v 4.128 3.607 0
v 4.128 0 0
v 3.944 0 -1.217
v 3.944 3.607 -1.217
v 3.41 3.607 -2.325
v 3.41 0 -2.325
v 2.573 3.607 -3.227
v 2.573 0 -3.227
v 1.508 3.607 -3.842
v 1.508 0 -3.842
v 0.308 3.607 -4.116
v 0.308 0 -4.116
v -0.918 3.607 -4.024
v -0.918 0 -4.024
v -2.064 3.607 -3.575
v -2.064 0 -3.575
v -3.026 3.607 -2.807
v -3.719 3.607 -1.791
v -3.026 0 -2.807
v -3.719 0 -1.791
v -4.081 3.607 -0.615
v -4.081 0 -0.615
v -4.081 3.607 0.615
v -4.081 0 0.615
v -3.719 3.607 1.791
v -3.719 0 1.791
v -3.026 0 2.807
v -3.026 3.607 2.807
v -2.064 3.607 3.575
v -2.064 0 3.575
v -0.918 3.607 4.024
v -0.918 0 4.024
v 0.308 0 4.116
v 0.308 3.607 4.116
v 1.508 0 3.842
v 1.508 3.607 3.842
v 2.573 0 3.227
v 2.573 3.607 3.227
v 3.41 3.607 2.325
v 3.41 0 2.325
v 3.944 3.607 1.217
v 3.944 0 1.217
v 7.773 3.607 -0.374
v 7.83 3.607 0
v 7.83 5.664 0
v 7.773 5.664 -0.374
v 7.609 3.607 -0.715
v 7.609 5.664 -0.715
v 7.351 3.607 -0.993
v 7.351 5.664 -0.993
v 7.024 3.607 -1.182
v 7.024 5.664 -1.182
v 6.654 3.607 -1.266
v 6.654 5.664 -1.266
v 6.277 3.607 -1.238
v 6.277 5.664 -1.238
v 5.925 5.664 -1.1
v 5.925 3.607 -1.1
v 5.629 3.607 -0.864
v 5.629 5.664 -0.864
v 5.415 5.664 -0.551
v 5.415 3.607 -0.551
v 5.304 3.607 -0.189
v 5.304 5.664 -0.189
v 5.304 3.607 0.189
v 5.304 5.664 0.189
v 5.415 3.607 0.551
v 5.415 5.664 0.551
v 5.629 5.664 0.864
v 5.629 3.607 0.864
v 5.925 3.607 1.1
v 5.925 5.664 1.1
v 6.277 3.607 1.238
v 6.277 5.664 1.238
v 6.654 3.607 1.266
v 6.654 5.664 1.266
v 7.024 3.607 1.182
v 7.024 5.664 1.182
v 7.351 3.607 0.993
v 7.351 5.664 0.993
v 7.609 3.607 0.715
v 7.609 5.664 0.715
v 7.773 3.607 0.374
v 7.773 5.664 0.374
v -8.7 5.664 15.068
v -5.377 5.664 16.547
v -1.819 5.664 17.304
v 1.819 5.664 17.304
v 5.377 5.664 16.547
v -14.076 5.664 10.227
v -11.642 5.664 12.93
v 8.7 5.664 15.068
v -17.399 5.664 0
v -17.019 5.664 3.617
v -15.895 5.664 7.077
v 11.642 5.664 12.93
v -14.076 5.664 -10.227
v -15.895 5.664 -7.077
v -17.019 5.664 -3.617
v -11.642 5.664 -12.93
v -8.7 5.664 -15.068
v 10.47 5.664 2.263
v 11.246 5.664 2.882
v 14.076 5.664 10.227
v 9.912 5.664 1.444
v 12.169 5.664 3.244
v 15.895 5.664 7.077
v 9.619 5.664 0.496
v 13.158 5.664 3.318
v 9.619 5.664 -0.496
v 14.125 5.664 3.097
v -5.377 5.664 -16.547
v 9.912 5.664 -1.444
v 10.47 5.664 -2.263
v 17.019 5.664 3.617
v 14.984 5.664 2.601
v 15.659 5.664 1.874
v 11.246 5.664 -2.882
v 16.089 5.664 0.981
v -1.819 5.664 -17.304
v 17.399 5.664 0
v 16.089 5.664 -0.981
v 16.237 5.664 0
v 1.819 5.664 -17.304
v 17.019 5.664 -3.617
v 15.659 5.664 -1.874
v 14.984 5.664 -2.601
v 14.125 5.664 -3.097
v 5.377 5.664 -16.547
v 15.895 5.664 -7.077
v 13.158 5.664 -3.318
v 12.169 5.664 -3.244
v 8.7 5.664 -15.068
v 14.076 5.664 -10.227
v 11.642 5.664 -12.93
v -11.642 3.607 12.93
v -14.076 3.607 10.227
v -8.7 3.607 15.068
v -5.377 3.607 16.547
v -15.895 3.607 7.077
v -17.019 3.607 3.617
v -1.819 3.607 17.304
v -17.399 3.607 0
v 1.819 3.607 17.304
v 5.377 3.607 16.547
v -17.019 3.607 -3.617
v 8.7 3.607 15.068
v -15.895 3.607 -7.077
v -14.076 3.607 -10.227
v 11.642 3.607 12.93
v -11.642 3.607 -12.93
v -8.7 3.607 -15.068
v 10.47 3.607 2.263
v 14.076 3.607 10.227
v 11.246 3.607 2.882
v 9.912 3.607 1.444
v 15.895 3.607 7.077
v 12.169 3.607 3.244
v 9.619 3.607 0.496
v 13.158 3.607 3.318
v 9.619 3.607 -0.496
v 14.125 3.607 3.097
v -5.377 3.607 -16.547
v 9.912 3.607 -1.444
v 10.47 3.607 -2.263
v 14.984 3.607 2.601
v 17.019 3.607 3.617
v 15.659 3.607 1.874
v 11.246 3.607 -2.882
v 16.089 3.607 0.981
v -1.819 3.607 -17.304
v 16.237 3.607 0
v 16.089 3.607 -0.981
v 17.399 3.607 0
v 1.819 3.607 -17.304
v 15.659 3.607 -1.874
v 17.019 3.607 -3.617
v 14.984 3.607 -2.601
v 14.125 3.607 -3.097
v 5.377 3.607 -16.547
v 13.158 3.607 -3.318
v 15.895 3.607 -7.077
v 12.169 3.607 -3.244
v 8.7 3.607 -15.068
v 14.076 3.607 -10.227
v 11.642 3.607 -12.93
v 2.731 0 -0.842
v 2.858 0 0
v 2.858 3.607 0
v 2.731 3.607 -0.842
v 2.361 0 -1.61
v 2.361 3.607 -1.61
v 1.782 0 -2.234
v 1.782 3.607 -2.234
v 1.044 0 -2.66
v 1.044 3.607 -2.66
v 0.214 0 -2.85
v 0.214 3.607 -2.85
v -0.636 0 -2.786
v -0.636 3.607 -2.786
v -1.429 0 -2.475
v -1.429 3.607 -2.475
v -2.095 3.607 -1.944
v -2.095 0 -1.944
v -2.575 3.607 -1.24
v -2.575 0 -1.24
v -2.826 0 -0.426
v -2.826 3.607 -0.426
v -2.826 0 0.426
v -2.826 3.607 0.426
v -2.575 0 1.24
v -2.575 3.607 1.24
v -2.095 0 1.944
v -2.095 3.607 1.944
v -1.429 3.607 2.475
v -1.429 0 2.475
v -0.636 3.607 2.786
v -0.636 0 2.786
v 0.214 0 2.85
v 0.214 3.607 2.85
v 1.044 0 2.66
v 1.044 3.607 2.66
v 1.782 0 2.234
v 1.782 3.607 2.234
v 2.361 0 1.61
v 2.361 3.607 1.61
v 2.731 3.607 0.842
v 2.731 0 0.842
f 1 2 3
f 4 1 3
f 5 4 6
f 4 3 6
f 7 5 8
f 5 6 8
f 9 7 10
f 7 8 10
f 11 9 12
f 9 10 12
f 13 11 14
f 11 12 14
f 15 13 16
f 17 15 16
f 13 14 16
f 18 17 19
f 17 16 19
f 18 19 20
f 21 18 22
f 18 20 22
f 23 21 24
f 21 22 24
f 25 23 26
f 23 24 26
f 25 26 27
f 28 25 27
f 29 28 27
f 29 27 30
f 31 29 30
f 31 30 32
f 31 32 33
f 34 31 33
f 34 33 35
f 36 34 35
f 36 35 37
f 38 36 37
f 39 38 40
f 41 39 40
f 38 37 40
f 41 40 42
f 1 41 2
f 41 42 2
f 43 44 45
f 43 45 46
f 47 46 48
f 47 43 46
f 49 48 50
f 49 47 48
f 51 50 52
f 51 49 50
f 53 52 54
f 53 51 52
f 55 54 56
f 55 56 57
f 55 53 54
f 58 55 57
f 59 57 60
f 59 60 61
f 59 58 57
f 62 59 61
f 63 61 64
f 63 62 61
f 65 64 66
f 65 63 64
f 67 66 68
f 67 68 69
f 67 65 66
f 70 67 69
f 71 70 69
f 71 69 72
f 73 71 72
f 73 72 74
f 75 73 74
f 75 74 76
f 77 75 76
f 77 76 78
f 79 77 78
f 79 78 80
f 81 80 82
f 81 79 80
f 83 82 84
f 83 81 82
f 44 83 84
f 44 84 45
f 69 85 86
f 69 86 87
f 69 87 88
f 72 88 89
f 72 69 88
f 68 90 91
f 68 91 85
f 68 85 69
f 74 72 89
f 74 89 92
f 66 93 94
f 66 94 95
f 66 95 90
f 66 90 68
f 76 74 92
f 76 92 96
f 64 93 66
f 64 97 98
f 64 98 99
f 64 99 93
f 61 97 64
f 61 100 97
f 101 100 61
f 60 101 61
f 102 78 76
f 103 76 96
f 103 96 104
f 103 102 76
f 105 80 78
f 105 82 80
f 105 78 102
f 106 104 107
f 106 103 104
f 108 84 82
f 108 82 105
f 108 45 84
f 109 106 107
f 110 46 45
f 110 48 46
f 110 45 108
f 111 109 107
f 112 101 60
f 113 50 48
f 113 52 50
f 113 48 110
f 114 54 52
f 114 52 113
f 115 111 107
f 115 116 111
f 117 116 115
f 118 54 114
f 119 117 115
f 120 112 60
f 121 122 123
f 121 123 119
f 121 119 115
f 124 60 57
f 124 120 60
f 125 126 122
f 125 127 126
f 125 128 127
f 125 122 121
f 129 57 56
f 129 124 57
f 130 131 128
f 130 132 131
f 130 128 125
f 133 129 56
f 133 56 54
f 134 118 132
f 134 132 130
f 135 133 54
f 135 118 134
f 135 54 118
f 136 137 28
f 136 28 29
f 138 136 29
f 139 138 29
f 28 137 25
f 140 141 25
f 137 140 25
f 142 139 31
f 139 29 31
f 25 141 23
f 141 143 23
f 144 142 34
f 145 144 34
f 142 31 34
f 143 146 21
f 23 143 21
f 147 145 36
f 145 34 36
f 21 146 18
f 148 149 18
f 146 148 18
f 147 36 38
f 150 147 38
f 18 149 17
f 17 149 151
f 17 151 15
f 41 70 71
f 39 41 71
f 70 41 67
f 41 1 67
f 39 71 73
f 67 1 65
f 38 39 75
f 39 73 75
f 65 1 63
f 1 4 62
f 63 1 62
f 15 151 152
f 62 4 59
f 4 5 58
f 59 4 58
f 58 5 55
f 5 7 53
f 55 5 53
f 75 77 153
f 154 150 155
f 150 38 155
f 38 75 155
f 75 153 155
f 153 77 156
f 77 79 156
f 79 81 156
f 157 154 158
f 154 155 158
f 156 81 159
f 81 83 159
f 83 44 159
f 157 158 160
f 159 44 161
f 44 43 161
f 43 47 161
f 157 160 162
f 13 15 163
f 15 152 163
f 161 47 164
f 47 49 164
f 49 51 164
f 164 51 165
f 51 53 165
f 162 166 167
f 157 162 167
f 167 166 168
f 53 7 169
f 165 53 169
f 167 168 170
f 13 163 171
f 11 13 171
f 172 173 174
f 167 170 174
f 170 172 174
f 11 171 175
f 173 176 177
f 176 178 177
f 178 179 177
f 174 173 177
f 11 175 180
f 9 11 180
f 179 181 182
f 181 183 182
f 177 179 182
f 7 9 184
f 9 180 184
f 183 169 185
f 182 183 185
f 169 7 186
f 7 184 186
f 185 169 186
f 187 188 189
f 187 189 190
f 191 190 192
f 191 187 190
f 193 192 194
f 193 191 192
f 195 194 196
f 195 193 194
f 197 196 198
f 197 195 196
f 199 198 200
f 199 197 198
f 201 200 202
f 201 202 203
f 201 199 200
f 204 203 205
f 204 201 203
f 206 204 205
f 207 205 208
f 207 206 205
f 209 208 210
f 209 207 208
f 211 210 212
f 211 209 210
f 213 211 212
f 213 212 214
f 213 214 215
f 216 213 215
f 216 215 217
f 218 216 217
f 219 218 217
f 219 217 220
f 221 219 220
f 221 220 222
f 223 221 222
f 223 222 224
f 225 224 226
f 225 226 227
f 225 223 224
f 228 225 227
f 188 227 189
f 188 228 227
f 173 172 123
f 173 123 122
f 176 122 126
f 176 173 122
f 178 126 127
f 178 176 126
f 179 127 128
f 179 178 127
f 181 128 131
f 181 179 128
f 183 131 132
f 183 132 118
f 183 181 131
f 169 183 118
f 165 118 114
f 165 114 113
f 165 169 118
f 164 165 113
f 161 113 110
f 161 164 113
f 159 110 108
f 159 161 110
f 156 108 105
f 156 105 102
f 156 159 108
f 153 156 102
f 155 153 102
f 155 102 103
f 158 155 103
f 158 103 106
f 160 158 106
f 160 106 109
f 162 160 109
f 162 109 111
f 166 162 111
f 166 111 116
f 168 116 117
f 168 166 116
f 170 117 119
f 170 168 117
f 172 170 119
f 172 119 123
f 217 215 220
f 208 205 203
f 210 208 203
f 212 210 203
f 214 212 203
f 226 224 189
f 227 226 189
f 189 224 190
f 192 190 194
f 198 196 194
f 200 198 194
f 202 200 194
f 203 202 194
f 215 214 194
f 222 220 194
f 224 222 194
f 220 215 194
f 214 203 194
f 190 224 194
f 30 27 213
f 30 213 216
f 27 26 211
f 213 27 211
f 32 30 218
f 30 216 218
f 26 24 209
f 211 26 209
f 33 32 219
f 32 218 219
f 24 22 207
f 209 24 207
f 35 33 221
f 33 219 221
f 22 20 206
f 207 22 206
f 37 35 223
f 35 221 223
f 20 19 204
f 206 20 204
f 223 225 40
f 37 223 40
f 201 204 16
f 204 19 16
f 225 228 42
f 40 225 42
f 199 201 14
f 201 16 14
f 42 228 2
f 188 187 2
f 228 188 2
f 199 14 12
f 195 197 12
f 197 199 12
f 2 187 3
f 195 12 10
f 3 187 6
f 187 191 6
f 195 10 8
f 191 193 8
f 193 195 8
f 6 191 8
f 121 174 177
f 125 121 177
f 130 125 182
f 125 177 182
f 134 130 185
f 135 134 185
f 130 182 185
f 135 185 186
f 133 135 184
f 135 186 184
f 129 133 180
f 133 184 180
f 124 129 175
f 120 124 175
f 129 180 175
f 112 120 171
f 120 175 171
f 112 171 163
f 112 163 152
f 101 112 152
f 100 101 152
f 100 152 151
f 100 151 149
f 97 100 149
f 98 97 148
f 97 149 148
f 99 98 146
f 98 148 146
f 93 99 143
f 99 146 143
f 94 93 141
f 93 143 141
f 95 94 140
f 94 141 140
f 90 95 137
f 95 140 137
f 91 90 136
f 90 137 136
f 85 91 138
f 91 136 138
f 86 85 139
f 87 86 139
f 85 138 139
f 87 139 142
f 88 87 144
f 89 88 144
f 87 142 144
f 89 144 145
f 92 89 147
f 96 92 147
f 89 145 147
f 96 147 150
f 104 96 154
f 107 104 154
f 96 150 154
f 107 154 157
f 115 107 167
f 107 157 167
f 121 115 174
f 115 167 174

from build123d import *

# Parameters (mm, degrees)
SKETCH1_R           = 4.1275
SKETCH1_R_2         = 2.8575
BOSS_EXTRUDE1_DEPTH = 3.6068
SKETCH3_R           = 17.399
SKETCH3_R_2         = 3.3274
SKETCH3_R_3         = 1.27
BOSS_EXTRUDE2_DEPTH = 2.0574


with BuildPart() as part:
    # Sketch1 → Boss-Extrude1 (new body)
    with BuildSketch(Plane(origin=(0, 0, 0), x_dir=(1, 0, 0), z_dir=(0, 1, 0))):
        Circle(SKETCH1_R)
        Circle(SKETCH1_R_2, mode=Mode.SUBTRACT)
    extrude(amount=BOSS_EXTRUDE1_DEPTH)

    # Sketch3 → Boss-Extrude2 (add)
    with BuildSketch(Plane(origin=(0, 3.6068, 0), x_dir=(1, 0, 0), z_dir=(0, 1, 0))):
        Circle(SKETCH3_R)
        with Locations((12.90955, 0)):
            Circle(SKETCH3_R_2, mode=Mode.SUBTRACT)
        with Locations((6.55955, 0)):
            Circle(SKETCH3_R_3, mode=Mode.SUBTRACT)
    extrude(amount=BOSS_EXTRUDE2_DEPTH)


solid = part.part
